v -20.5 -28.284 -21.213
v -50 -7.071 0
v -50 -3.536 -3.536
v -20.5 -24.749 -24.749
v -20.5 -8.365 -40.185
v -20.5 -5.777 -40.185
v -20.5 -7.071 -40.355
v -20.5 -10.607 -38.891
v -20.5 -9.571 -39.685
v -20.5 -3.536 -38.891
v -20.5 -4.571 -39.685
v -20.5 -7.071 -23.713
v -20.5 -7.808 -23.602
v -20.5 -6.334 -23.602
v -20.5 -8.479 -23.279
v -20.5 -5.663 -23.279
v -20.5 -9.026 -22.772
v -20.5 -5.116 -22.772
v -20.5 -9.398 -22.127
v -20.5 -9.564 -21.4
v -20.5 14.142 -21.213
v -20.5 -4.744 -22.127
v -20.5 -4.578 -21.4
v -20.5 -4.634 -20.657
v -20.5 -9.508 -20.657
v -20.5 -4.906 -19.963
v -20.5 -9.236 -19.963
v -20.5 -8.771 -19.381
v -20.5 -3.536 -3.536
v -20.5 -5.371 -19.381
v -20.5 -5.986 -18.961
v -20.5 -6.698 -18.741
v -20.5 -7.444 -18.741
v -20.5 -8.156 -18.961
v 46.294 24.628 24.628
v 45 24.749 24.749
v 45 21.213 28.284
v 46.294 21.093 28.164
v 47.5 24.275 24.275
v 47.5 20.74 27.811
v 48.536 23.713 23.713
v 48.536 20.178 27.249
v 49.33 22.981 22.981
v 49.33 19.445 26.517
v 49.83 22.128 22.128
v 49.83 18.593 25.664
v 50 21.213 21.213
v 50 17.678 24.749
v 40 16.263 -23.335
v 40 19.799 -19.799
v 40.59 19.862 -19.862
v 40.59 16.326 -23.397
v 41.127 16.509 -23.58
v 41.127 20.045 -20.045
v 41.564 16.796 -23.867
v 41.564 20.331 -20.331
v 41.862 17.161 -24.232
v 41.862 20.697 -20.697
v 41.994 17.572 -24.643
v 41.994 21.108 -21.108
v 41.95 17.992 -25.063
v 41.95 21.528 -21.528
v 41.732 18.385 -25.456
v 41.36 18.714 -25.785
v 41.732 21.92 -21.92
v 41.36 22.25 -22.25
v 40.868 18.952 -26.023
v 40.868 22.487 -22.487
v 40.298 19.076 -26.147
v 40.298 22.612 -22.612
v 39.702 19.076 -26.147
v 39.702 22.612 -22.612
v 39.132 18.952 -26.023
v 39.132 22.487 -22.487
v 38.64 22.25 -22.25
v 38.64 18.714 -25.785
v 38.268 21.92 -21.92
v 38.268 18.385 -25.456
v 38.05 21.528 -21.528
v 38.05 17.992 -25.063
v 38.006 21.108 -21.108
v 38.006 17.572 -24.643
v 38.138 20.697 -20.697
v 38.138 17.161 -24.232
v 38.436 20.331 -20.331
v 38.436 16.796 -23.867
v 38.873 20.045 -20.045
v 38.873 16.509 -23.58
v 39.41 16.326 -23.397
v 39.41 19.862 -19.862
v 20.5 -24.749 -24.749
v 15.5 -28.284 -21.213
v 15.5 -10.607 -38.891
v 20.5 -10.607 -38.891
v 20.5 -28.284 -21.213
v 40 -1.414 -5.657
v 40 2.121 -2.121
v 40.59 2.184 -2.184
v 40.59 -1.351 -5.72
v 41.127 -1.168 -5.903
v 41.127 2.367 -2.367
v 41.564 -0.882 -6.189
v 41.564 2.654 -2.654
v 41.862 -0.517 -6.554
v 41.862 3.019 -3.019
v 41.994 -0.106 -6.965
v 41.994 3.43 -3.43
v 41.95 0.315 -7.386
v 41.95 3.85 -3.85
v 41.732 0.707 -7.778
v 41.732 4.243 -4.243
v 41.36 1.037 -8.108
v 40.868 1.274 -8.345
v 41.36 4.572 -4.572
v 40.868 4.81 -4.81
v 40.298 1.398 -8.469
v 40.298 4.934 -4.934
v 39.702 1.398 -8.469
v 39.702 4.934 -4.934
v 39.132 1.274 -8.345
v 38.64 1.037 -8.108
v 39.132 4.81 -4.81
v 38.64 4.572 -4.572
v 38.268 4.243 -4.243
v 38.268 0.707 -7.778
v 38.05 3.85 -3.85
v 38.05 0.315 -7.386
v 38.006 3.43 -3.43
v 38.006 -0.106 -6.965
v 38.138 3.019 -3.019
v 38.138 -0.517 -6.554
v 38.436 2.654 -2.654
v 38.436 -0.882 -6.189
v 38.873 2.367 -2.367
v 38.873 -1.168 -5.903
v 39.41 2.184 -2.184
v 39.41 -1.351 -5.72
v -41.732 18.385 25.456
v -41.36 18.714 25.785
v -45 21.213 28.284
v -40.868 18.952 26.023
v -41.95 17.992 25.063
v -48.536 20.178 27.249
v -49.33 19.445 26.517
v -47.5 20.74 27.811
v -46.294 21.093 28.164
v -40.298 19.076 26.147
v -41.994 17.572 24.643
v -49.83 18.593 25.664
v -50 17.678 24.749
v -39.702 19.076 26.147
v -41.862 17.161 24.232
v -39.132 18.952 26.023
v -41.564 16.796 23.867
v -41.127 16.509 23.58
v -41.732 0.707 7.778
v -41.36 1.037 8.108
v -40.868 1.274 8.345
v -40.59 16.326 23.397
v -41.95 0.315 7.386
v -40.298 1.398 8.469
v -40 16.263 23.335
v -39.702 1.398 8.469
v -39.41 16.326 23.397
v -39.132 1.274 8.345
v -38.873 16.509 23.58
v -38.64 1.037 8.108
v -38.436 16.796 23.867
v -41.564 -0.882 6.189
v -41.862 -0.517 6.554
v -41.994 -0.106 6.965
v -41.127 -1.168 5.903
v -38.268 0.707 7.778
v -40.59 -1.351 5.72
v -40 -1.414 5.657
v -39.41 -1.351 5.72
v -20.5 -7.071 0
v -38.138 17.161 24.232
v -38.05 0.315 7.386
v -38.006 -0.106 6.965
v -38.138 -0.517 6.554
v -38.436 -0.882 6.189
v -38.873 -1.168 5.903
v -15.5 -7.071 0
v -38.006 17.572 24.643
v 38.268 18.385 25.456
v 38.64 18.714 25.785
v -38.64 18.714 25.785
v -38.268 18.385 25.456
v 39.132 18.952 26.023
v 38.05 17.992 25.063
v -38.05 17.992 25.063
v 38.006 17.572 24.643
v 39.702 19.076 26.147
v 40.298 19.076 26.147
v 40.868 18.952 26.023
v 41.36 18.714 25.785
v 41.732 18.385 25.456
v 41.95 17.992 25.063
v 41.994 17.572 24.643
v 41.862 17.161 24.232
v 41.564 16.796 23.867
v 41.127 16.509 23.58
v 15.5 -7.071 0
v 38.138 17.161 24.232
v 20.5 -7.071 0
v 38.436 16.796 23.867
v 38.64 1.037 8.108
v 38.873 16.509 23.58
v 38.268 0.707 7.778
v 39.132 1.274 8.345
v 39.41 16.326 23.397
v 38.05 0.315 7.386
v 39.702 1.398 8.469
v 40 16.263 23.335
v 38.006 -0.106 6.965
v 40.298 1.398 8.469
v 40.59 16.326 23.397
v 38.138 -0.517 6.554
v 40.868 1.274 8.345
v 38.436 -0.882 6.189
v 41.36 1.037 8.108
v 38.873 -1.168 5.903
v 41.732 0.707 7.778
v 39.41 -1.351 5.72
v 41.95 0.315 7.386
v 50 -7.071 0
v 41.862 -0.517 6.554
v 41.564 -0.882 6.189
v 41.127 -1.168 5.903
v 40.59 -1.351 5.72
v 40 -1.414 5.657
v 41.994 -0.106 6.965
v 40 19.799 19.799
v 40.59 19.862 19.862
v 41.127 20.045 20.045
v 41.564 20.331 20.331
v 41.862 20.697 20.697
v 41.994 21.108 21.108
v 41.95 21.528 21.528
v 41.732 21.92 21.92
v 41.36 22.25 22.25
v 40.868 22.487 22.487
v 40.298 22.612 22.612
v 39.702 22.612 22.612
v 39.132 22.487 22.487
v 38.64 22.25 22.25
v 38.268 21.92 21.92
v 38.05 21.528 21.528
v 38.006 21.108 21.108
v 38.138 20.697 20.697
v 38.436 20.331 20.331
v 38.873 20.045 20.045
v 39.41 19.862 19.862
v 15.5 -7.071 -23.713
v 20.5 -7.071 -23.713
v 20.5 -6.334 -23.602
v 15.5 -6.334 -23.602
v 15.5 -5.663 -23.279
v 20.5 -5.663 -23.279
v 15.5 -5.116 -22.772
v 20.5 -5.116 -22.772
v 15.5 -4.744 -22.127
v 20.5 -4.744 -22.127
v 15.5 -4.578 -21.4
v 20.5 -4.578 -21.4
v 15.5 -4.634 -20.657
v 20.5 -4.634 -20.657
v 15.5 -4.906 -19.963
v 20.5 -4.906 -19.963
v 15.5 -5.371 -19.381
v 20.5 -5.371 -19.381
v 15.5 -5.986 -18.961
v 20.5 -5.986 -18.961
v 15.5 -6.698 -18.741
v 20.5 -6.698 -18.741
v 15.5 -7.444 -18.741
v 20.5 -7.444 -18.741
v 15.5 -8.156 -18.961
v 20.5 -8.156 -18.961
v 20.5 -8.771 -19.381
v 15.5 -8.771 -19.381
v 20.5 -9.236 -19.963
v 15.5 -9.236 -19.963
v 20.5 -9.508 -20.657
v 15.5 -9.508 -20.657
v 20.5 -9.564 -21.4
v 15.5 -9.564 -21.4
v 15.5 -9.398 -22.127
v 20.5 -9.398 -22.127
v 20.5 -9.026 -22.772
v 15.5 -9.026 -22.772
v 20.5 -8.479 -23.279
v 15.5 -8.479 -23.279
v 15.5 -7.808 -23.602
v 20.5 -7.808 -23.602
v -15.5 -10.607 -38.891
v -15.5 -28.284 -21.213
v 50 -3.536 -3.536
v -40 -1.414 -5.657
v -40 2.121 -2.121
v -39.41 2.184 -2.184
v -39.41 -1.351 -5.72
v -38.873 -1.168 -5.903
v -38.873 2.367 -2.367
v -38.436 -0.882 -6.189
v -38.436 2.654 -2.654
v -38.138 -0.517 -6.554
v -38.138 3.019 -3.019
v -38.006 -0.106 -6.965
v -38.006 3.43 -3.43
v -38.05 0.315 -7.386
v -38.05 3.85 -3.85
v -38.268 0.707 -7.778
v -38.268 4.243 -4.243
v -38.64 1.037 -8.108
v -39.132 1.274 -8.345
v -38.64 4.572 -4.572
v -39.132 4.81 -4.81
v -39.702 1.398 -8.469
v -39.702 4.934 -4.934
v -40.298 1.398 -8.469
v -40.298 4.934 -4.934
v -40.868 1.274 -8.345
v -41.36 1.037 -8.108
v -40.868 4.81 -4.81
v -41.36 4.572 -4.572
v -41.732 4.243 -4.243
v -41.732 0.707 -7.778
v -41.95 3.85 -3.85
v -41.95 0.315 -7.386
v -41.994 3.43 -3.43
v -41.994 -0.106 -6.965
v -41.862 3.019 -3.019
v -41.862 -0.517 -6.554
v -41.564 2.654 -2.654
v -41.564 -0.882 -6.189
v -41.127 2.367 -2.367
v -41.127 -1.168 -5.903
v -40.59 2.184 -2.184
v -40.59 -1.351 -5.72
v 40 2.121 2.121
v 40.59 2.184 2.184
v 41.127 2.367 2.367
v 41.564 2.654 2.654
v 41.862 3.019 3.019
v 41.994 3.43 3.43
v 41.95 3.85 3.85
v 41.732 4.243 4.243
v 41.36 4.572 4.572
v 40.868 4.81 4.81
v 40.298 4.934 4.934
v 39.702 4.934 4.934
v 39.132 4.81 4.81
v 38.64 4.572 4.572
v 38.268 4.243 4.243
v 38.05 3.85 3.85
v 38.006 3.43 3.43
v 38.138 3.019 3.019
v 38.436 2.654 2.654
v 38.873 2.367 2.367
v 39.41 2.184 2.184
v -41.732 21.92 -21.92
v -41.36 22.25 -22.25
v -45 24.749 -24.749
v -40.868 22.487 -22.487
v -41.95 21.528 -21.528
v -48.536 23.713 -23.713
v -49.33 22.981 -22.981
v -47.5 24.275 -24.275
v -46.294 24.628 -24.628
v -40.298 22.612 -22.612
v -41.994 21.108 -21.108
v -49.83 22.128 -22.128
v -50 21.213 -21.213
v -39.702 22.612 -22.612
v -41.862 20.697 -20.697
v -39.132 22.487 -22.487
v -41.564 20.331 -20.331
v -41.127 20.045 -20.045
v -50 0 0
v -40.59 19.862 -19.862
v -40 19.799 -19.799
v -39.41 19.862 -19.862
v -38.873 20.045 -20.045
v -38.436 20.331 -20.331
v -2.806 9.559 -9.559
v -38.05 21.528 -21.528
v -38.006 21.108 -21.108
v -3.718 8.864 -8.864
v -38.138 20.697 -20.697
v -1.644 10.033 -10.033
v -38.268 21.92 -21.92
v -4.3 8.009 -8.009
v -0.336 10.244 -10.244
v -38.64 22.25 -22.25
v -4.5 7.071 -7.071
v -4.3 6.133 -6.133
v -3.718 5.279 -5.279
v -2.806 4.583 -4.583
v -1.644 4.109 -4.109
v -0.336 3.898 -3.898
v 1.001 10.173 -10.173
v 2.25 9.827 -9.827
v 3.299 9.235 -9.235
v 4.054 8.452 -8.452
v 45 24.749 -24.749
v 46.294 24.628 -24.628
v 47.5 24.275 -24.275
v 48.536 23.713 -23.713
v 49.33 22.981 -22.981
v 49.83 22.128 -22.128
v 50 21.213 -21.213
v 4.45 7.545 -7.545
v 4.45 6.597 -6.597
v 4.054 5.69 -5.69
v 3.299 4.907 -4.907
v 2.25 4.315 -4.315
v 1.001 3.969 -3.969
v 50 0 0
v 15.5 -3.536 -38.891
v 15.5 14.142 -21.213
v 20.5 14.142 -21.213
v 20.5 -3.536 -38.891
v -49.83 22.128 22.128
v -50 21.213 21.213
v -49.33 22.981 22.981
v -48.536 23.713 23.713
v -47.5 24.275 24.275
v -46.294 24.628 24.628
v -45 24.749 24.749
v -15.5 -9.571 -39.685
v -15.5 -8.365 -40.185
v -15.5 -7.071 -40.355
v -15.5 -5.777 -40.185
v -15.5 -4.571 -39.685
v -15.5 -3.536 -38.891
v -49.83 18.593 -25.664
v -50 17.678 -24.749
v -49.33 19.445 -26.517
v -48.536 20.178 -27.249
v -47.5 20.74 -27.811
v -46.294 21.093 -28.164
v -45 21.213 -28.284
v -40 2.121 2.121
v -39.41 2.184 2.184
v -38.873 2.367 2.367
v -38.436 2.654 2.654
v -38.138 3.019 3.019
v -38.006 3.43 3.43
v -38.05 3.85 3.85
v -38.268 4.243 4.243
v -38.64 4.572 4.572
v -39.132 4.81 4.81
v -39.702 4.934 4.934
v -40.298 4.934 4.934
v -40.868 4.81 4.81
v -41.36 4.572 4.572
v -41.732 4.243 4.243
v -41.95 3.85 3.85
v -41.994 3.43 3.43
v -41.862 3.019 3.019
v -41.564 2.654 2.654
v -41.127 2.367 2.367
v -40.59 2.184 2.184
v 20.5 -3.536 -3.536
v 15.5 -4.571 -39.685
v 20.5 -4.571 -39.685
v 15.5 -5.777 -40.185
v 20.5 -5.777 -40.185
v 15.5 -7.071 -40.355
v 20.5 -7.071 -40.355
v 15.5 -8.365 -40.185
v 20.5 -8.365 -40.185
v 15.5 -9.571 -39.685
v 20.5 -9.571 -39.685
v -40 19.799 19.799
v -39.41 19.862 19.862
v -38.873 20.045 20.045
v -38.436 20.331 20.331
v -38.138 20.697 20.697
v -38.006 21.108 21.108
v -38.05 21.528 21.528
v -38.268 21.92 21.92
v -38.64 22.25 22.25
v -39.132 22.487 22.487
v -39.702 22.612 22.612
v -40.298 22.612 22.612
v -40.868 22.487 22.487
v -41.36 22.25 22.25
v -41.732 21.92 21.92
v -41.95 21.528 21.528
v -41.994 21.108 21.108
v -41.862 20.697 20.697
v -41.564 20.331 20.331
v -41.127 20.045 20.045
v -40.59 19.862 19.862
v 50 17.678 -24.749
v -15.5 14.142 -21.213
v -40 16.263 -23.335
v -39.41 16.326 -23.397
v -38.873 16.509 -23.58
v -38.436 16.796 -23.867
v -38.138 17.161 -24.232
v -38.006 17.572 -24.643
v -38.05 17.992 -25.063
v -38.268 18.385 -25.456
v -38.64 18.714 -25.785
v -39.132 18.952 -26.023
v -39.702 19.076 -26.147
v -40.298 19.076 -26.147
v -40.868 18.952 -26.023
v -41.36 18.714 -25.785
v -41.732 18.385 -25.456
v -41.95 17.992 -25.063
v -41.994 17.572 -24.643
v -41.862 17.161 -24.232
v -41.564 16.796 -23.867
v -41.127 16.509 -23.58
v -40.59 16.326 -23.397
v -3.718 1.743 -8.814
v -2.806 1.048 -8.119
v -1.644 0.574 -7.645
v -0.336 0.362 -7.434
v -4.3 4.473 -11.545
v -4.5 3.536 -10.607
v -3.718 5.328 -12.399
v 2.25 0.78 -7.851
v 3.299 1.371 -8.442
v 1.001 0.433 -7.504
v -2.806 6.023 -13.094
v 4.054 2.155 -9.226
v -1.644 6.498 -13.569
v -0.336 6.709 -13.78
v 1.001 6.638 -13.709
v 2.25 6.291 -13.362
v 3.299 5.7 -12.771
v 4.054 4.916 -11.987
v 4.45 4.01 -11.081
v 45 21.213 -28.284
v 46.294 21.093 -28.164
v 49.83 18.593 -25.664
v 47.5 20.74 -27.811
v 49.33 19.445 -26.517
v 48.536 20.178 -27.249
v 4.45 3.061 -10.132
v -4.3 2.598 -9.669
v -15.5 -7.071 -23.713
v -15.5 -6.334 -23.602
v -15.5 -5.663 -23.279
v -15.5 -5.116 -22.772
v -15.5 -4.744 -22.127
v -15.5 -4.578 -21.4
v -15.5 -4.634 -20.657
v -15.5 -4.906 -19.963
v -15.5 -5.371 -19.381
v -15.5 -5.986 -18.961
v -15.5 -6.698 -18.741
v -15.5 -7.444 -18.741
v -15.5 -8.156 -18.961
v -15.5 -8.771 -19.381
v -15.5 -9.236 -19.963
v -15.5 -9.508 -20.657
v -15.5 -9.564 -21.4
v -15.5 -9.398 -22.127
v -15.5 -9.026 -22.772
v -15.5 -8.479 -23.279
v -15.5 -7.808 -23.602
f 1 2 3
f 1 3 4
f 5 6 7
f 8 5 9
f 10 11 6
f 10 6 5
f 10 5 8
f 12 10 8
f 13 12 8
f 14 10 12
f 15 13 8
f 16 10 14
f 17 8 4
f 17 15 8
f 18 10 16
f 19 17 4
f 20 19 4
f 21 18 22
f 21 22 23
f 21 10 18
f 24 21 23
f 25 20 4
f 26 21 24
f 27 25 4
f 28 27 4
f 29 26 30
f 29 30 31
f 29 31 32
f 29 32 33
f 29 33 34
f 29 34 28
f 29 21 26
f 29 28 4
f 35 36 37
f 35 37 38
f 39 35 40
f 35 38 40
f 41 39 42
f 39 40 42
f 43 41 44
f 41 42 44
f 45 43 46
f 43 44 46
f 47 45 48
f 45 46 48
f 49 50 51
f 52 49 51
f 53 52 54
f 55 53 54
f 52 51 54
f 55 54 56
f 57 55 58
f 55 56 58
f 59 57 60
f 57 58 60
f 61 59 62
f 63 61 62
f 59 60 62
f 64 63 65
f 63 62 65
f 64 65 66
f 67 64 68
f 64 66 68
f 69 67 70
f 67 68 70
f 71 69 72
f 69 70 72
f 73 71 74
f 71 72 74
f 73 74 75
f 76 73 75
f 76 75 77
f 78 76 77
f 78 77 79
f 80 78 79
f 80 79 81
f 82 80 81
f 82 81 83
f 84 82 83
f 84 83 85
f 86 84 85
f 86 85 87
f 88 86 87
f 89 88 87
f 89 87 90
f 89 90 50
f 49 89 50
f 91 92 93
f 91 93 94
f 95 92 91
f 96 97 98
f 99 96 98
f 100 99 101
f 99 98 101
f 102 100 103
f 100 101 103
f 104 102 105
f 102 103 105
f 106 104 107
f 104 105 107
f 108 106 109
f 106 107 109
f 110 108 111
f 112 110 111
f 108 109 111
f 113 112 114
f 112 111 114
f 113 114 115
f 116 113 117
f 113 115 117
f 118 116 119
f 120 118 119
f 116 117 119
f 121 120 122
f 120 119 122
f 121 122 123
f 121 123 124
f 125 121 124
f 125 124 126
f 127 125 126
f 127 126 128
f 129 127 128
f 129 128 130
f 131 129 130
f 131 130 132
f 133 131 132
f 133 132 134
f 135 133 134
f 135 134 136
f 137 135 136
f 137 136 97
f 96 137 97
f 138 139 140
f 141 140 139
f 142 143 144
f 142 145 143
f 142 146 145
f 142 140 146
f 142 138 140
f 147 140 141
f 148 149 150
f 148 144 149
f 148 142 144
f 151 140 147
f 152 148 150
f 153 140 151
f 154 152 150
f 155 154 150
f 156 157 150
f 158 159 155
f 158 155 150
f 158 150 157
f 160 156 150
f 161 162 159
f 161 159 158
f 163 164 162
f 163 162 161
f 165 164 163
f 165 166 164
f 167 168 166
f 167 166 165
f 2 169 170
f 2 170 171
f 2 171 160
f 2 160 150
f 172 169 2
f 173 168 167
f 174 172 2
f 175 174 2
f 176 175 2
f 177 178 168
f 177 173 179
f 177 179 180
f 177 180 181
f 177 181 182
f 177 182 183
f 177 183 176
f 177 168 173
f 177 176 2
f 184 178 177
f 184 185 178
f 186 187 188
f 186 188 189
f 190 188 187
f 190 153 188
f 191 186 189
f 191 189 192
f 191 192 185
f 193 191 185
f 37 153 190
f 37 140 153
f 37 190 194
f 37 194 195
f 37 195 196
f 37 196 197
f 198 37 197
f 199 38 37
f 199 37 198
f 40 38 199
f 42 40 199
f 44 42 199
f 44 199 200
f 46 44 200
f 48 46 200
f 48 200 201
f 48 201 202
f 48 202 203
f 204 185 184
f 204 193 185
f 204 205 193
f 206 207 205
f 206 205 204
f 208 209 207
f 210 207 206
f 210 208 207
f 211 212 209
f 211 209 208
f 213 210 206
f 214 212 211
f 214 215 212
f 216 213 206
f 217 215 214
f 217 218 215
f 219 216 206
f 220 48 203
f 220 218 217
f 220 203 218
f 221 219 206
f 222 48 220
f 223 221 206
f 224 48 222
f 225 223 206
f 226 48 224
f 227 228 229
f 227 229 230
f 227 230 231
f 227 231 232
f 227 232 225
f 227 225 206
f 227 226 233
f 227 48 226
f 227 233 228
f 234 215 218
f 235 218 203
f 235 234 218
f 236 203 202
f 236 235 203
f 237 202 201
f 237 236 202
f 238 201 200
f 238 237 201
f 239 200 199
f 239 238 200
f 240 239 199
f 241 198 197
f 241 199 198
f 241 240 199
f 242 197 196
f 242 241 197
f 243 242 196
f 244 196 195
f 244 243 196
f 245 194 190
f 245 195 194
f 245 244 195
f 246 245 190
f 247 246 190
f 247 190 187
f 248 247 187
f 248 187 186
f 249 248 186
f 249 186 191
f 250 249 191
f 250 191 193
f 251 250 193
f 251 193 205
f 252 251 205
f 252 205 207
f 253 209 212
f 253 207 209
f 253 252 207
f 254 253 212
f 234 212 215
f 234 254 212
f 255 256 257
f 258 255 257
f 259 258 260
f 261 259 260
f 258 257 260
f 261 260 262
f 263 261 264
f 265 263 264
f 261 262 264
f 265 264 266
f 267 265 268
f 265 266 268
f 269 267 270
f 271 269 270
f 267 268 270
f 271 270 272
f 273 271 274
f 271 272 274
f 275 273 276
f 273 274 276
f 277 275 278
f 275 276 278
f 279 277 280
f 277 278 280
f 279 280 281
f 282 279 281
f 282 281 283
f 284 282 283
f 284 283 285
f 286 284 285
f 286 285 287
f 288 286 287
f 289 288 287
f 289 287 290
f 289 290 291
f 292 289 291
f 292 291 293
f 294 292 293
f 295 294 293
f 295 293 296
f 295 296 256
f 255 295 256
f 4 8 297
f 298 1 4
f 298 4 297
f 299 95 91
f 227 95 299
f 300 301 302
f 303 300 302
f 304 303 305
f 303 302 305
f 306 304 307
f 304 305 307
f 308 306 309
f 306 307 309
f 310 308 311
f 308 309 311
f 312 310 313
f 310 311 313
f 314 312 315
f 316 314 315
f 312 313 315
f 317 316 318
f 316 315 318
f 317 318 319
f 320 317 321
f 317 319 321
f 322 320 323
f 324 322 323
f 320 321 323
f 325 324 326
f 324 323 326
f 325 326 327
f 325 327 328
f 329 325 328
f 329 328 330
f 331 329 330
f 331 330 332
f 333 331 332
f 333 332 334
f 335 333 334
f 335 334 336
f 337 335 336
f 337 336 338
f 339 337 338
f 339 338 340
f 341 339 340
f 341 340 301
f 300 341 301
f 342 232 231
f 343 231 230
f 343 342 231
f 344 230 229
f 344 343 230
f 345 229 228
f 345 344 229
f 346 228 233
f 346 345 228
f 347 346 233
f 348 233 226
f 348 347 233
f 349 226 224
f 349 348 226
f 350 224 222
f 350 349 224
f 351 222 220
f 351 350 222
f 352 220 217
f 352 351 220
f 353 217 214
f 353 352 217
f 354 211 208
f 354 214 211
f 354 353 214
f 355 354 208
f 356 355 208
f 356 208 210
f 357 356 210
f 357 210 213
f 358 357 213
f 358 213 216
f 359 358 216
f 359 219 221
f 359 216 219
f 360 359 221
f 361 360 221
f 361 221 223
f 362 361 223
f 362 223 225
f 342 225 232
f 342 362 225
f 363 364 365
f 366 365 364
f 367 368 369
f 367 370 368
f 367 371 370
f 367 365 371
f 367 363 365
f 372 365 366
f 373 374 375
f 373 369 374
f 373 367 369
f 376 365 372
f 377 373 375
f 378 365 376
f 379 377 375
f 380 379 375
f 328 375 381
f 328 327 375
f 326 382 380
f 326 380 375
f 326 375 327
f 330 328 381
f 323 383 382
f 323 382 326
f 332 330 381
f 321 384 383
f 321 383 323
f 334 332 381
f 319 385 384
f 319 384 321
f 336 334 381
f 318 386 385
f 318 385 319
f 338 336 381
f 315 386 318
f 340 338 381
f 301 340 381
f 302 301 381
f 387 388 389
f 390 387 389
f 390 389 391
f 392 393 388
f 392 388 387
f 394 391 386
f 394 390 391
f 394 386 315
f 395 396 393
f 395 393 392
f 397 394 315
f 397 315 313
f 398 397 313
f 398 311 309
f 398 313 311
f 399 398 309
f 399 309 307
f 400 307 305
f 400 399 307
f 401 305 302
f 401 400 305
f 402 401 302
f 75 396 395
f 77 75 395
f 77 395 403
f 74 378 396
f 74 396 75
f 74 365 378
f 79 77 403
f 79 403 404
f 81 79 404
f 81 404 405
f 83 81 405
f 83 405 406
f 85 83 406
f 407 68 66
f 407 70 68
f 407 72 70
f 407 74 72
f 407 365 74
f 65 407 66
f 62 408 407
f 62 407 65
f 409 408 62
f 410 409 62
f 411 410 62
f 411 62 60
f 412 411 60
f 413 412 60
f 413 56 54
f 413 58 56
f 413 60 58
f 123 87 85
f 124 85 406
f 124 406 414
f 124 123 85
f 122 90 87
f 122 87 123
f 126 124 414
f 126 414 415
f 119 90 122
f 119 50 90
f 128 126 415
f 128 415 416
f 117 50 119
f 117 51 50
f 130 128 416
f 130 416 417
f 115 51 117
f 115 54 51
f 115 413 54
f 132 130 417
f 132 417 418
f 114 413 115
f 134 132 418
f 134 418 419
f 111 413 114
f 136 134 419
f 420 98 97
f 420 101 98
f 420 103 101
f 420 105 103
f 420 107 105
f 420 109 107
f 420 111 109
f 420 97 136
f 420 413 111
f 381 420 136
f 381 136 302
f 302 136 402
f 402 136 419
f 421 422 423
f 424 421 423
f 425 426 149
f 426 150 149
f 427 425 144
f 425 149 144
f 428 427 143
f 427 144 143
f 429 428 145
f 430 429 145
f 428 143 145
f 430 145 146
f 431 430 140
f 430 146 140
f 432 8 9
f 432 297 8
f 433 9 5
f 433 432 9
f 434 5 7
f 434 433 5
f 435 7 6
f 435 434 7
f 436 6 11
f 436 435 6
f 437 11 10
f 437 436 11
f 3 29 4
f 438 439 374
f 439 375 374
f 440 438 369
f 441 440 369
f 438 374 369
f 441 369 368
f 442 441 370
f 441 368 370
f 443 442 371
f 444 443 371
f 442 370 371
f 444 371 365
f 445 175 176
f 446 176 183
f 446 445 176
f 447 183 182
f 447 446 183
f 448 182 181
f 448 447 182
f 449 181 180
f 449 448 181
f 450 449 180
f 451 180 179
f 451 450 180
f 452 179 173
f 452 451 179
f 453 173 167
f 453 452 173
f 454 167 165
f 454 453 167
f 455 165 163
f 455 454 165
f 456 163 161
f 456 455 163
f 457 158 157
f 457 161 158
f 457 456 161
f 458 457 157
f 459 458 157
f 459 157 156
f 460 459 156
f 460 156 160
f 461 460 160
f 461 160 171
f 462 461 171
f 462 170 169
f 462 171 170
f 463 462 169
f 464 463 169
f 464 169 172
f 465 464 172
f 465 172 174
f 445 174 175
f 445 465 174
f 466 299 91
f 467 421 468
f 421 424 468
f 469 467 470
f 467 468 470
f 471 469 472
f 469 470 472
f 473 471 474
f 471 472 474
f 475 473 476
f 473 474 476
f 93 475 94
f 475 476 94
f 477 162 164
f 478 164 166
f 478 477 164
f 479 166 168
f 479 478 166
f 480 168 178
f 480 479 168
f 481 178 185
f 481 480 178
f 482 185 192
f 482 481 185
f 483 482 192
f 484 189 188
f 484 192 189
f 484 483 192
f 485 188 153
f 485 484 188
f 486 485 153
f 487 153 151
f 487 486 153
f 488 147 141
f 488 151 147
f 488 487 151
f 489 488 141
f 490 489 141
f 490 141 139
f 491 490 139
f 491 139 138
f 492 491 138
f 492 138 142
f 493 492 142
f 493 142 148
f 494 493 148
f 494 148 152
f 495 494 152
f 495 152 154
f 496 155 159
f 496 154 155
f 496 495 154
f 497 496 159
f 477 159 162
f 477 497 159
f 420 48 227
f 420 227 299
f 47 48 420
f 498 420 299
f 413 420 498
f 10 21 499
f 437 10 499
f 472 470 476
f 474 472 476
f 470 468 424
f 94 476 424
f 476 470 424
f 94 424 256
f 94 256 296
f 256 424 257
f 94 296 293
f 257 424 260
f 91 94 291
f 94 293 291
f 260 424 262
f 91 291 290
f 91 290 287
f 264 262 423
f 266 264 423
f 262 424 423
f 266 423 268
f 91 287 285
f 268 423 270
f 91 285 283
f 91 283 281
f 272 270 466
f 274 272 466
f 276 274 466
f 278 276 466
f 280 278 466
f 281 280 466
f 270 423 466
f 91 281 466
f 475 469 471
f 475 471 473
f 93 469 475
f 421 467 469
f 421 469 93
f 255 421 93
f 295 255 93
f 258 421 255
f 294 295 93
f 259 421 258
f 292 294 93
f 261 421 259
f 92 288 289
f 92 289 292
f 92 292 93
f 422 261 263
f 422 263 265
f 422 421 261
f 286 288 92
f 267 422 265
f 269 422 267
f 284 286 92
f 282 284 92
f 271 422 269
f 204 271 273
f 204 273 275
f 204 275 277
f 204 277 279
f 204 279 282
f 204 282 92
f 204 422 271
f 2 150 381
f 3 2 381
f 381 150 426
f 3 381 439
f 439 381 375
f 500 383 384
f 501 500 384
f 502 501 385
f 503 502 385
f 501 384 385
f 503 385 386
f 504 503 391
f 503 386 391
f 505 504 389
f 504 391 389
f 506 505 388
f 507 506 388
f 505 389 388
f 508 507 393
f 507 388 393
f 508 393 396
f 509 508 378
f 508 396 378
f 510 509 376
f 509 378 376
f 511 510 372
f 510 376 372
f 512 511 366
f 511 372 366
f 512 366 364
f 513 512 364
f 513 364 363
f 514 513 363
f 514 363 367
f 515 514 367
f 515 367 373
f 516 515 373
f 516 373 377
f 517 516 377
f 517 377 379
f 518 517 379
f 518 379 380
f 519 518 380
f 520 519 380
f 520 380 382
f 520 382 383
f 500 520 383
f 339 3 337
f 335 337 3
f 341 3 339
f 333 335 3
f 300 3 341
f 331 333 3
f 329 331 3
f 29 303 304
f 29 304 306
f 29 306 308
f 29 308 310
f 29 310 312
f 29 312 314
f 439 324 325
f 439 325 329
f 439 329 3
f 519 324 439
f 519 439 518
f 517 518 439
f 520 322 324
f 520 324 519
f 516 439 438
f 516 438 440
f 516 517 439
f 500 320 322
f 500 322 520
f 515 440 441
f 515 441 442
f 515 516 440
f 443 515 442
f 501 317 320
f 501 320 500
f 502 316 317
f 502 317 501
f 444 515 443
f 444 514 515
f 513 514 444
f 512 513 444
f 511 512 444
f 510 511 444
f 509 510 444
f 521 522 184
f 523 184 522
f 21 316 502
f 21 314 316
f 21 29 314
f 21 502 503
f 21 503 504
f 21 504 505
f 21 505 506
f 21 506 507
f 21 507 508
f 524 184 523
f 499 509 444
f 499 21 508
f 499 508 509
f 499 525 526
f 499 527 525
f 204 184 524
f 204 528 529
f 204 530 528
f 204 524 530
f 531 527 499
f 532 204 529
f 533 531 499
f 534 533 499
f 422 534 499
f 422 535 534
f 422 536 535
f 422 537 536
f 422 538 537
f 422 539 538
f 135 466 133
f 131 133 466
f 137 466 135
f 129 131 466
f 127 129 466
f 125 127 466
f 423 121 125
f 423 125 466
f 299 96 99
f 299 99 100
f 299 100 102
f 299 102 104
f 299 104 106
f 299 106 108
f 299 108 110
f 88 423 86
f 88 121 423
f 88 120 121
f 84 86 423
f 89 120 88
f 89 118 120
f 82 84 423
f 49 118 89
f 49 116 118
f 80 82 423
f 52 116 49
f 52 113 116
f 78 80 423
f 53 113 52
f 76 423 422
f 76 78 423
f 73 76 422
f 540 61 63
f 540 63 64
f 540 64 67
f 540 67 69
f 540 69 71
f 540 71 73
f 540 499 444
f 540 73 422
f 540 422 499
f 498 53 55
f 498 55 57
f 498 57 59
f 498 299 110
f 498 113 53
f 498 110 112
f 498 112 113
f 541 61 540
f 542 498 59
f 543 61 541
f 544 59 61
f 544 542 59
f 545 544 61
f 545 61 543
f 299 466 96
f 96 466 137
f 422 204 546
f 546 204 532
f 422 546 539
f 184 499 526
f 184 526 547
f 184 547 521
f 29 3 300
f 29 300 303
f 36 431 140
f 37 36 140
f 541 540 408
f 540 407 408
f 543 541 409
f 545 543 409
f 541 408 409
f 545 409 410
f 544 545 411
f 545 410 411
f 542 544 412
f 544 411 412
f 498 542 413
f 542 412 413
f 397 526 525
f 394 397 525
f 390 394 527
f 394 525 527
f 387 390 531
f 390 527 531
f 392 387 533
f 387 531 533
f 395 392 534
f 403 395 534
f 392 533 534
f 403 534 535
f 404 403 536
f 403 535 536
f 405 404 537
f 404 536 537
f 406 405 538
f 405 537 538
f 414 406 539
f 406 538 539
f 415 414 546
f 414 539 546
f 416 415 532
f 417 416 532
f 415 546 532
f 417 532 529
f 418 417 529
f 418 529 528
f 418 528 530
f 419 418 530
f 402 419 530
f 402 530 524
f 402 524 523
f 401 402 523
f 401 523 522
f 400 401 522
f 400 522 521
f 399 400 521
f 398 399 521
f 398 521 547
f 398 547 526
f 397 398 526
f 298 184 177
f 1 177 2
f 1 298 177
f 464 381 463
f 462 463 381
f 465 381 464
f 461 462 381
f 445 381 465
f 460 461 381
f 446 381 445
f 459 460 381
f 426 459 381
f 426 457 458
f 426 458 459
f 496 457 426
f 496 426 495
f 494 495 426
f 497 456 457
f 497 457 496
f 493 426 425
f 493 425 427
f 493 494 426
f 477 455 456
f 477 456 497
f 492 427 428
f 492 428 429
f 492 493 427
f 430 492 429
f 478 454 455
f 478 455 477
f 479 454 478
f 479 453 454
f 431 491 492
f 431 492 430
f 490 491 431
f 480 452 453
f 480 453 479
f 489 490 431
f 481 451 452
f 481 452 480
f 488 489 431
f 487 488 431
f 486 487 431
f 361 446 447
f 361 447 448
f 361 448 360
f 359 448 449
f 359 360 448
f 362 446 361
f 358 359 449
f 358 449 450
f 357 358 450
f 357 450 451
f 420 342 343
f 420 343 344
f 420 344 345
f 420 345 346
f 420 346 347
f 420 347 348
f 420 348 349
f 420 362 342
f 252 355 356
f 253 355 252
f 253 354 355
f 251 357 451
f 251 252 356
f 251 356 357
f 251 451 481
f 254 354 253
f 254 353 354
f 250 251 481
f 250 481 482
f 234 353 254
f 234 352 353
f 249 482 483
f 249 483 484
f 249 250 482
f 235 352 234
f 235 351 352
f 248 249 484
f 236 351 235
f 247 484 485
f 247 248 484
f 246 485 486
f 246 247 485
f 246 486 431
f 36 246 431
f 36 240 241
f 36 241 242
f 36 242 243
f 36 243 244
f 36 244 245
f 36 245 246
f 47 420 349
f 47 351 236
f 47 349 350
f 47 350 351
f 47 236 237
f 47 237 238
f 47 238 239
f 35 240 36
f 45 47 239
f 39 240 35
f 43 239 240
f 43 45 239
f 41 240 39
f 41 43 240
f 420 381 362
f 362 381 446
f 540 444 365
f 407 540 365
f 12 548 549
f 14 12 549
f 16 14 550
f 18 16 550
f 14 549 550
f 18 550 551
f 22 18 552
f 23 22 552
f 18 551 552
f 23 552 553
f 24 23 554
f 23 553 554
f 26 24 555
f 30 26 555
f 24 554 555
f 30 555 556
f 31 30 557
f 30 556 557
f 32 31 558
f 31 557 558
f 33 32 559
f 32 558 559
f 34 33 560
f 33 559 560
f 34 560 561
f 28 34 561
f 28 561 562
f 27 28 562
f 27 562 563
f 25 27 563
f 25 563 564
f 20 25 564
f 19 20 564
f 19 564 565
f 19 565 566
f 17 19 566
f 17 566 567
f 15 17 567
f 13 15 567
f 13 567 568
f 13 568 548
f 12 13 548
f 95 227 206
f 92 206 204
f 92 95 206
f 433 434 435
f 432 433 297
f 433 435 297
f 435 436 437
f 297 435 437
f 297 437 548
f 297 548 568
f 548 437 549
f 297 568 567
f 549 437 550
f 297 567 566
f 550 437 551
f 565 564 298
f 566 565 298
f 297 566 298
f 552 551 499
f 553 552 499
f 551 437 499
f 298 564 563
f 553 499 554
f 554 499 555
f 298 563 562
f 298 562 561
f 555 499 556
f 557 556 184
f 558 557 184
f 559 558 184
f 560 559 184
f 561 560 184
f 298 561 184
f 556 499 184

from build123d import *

# Parameters (mm, degrees)
BOSS_EXTRUDE1_DEPTH  = 50
M8_CLEARANCE_HOLE1_D = 9
SKETCH7_W            = 5
SKETCH7_H            = 30
BOSS_EXTRUDE4_DEPTH  = 30
SKETCH9_R            = 2.5
CUT_EXTRUDE1_DEPTH   = 88.007183611
SKETCH11_R           = 2
CUT_EXTRUDE2_DEPTH   = 72.414284285
BOSS_EXTRUDE7_DEPTH  = 5
FILLET4_R            = 5


with BuildPart() as part:
    # Sketch2 → Boss-Extrude1 (new, symmetric)
    with BuildSketch(Plane(origin=(0, 0, 0), x_dir=(0, 0, -1), z_dir=(1, 0, 0))):
        Polygon((0, 0), (-24.748737342, 24.748737342), (-28.284271247, 21.213203436), (0, -7.071067812), (28.284271247, 21.213203436), (24.748737342, 24.748737342), align=None)
    extrude(amount=BOSS_EXTRUDE1_DEPTH, both=True)

    # M8 Clearance Hole1 (through all)
    with Locations(Plane(origin=(0, 0, 0), x_dir=(1, 0, 0), z_dir=(0, 0.7071067811865489, 0.7071067811865461))):
        with Locations((0, 10)):
            Hole(M8_CLEARANCE_HOLE1_D / 2)

    # Sketch7 → Boss-Extrude4 (add)
    with BuildSketch(Plane(origin=(0, -3.535533906, -3.535533906), x_dir=(1, 0, 0), z_dir=(0, -0.7071067811865479, -0.7071067811865471))):
        with Locations((18, -10)):
            Rectangle(SKETCH7_W, SKETCH7_H)
        with Locations((-18, -10)):
            Rectangle(SKETCH7_W, SKETCH7_H)
    extrude(amount=BOSS_EXTRUDE4_DEPTH)

    # Sketch9 → Cut-Extrude1 (cut, through all)
    with BuildSketch(Plane(origin=(20.5, 0, 0), x_dir=(0, 0, -1), z_dir=(1, 0, 0))):
        with Locations((21.213203436, -7.071067812)):
            Circle(SKETCH9_R)
    extrude(amount=-CUT_EXTRUDE1_DEPTH, mode=Mode.SUBTRACT)

    # Sketch11 → Cut-Extrude2 (cut, through all)
    with BuildSketch(Plane(origin=(0, 0, 0), x_dir=(1, 0, 0), z_dir=(0, 0.7071067811865477, 0.7071067811865474))):
        with Locations((-40, 30)):
            Circle(SKETCH11_R)
        with Locations((-40, 5)):
            Circle(SKETCH11_R)
        with Locations((40, 30)):
            Circle(SKETCH11_R)
        with Locations((40, 5)):
            Circle(SKETCH11_R)
    cut_extrude2 = extrude(amount=-CUT_EXTRUDE2_DEPTH, mode=Mode.SUBTRACT)

    # Mirror1: Cut-Extrude2 across plane
    add(cut_extrude2.mirror(Plane.XY), mode=Mode.SUBTRACT)

    # Sketch12 → Boss-Extrude7 (add)
    with BuildSketch(Plane(origin=(0, -3.535533906, 3.535533906), x_dir=(1, 0, 0), z_dir=(0, 0.7071067811865475, -0.7071067811865477))):
        Polygon((-50, 5), (-20.5, 35), (-20.5, 5), align=None)
        Polygon((20.5, 5), (20.5, 35), (50, 5), align=None)
    extrude(amount=BOSS_EXTRUDE7_DEPTH)

    # Fillet4
    fillet4_edges = [part.edges().sort_by_distance(p)[0] for p in [
        (18, -7.071067812, -42.426406871),
        (-18, -7.071067812, -42.426406871),
        (-50, 22.980970389, -26.516504294),
        (-50, 22.980970389, 26.516504294),
        (50, 22.980970389, -26.516504294),
        (50, 22.980970389, 26.516504294),
    ]]
    fillet(fillet4_edges, radius=FILLET4_R)


solid = part.part
